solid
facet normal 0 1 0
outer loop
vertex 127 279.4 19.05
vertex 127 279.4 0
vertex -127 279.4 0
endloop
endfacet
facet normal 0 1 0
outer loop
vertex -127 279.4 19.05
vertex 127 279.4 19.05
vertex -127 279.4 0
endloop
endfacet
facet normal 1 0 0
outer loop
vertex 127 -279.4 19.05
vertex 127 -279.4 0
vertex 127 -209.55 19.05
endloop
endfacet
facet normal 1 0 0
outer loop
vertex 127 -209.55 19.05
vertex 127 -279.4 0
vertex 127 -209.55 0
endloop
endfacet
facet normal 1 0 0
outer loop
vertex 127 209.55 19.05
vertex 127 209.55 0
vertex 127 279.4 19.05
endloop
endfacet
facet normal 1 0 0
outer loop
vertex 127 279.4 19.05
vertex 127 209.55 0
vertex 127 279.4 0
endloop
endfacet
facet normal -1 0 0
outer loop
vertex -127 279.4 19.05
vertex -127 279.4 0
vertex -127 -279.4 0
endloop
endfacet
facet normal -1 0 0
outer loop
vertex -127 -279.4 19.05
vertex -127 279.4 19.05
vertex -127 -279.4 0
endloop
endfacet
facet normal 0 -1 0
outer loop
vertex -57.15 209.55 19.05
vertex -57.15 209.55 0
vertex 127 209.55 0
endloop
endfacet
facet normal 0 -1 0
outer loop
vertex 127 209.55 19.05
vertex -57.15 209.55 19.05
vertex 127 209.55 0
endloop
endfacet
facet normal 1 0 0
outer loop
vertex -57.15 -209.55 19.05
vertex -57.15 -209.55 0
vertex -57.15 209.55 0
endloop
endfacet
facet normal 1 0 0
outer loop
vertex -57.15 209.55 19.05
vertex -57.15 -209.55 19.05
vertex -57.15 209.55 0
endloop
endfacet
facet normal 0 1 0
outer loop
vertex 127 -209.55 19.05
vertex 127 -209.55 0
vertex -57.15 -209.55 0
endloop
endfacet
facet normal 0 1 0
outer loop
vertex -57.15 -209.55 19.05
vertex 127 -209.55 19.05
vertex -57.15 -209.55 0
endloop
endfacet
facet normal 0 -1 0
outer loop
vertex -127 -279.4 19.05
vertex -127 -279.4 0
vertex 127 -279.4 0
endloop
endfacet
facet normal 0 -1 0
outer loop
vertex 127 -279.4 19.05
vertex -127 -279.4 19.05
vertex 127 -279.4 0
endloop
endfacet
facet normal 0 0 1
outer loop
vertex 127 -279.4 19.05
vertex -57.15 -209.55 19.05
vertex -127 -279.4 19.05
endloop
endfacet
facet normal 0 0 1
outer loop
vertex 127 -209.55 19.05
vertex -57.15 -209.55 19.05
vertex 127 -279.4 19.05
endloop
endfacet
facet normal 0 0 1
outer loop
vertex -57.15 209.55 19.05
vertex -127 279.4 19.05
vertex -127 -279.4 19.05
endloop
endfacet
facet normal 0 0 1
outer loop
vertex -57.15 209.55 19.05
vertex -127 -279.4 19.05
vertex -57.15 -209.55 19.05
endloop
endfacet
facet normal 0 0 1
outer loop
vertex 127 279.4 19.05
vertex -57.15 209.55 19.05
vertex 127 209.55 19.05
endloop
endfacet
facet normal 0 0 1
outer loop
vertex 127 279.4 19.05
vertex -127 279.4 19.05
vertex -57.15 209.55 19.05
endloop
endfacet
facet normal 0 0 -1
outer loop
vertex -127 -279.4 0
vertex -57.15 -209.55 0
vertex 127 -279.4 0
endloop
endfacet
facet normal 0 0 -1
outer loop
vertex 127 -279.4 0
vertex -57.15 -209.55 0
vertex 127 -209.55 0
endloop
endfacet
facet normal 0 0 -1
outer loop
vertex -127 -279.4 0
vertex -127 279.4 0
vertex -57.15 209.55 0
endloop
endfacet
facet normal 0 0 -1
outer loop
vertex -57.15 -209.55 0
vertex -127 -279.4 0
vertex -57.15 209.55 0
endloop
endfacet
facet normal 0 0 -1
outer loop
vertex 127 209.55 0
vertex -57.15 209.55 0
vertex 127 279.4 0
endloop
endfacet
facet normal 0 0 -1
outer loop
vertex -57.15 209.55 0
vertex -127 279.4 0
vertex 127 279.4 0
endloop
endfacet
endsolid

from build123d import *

# Parameters (mm, degrees)
F1_DEPTH = 19.05


with BuildPart() as f1:
    # F0 (on Top) → F1 (new body)
    with BuildSketch(Plane.XY):
        Polygon((-57.15, -209.55), (-127, -209.55), (-127, -279.4), (127, -279.4), (127, -209.55), align=None)
        Polygon((127, 279.4), (-127, 279.4), (-127, -209.55), (-57.15, -209.55), (-57.15, 209.55), (127, 209.55), align=None)
    extrude(amount=F1_DEPTH)


solid = f1.part
